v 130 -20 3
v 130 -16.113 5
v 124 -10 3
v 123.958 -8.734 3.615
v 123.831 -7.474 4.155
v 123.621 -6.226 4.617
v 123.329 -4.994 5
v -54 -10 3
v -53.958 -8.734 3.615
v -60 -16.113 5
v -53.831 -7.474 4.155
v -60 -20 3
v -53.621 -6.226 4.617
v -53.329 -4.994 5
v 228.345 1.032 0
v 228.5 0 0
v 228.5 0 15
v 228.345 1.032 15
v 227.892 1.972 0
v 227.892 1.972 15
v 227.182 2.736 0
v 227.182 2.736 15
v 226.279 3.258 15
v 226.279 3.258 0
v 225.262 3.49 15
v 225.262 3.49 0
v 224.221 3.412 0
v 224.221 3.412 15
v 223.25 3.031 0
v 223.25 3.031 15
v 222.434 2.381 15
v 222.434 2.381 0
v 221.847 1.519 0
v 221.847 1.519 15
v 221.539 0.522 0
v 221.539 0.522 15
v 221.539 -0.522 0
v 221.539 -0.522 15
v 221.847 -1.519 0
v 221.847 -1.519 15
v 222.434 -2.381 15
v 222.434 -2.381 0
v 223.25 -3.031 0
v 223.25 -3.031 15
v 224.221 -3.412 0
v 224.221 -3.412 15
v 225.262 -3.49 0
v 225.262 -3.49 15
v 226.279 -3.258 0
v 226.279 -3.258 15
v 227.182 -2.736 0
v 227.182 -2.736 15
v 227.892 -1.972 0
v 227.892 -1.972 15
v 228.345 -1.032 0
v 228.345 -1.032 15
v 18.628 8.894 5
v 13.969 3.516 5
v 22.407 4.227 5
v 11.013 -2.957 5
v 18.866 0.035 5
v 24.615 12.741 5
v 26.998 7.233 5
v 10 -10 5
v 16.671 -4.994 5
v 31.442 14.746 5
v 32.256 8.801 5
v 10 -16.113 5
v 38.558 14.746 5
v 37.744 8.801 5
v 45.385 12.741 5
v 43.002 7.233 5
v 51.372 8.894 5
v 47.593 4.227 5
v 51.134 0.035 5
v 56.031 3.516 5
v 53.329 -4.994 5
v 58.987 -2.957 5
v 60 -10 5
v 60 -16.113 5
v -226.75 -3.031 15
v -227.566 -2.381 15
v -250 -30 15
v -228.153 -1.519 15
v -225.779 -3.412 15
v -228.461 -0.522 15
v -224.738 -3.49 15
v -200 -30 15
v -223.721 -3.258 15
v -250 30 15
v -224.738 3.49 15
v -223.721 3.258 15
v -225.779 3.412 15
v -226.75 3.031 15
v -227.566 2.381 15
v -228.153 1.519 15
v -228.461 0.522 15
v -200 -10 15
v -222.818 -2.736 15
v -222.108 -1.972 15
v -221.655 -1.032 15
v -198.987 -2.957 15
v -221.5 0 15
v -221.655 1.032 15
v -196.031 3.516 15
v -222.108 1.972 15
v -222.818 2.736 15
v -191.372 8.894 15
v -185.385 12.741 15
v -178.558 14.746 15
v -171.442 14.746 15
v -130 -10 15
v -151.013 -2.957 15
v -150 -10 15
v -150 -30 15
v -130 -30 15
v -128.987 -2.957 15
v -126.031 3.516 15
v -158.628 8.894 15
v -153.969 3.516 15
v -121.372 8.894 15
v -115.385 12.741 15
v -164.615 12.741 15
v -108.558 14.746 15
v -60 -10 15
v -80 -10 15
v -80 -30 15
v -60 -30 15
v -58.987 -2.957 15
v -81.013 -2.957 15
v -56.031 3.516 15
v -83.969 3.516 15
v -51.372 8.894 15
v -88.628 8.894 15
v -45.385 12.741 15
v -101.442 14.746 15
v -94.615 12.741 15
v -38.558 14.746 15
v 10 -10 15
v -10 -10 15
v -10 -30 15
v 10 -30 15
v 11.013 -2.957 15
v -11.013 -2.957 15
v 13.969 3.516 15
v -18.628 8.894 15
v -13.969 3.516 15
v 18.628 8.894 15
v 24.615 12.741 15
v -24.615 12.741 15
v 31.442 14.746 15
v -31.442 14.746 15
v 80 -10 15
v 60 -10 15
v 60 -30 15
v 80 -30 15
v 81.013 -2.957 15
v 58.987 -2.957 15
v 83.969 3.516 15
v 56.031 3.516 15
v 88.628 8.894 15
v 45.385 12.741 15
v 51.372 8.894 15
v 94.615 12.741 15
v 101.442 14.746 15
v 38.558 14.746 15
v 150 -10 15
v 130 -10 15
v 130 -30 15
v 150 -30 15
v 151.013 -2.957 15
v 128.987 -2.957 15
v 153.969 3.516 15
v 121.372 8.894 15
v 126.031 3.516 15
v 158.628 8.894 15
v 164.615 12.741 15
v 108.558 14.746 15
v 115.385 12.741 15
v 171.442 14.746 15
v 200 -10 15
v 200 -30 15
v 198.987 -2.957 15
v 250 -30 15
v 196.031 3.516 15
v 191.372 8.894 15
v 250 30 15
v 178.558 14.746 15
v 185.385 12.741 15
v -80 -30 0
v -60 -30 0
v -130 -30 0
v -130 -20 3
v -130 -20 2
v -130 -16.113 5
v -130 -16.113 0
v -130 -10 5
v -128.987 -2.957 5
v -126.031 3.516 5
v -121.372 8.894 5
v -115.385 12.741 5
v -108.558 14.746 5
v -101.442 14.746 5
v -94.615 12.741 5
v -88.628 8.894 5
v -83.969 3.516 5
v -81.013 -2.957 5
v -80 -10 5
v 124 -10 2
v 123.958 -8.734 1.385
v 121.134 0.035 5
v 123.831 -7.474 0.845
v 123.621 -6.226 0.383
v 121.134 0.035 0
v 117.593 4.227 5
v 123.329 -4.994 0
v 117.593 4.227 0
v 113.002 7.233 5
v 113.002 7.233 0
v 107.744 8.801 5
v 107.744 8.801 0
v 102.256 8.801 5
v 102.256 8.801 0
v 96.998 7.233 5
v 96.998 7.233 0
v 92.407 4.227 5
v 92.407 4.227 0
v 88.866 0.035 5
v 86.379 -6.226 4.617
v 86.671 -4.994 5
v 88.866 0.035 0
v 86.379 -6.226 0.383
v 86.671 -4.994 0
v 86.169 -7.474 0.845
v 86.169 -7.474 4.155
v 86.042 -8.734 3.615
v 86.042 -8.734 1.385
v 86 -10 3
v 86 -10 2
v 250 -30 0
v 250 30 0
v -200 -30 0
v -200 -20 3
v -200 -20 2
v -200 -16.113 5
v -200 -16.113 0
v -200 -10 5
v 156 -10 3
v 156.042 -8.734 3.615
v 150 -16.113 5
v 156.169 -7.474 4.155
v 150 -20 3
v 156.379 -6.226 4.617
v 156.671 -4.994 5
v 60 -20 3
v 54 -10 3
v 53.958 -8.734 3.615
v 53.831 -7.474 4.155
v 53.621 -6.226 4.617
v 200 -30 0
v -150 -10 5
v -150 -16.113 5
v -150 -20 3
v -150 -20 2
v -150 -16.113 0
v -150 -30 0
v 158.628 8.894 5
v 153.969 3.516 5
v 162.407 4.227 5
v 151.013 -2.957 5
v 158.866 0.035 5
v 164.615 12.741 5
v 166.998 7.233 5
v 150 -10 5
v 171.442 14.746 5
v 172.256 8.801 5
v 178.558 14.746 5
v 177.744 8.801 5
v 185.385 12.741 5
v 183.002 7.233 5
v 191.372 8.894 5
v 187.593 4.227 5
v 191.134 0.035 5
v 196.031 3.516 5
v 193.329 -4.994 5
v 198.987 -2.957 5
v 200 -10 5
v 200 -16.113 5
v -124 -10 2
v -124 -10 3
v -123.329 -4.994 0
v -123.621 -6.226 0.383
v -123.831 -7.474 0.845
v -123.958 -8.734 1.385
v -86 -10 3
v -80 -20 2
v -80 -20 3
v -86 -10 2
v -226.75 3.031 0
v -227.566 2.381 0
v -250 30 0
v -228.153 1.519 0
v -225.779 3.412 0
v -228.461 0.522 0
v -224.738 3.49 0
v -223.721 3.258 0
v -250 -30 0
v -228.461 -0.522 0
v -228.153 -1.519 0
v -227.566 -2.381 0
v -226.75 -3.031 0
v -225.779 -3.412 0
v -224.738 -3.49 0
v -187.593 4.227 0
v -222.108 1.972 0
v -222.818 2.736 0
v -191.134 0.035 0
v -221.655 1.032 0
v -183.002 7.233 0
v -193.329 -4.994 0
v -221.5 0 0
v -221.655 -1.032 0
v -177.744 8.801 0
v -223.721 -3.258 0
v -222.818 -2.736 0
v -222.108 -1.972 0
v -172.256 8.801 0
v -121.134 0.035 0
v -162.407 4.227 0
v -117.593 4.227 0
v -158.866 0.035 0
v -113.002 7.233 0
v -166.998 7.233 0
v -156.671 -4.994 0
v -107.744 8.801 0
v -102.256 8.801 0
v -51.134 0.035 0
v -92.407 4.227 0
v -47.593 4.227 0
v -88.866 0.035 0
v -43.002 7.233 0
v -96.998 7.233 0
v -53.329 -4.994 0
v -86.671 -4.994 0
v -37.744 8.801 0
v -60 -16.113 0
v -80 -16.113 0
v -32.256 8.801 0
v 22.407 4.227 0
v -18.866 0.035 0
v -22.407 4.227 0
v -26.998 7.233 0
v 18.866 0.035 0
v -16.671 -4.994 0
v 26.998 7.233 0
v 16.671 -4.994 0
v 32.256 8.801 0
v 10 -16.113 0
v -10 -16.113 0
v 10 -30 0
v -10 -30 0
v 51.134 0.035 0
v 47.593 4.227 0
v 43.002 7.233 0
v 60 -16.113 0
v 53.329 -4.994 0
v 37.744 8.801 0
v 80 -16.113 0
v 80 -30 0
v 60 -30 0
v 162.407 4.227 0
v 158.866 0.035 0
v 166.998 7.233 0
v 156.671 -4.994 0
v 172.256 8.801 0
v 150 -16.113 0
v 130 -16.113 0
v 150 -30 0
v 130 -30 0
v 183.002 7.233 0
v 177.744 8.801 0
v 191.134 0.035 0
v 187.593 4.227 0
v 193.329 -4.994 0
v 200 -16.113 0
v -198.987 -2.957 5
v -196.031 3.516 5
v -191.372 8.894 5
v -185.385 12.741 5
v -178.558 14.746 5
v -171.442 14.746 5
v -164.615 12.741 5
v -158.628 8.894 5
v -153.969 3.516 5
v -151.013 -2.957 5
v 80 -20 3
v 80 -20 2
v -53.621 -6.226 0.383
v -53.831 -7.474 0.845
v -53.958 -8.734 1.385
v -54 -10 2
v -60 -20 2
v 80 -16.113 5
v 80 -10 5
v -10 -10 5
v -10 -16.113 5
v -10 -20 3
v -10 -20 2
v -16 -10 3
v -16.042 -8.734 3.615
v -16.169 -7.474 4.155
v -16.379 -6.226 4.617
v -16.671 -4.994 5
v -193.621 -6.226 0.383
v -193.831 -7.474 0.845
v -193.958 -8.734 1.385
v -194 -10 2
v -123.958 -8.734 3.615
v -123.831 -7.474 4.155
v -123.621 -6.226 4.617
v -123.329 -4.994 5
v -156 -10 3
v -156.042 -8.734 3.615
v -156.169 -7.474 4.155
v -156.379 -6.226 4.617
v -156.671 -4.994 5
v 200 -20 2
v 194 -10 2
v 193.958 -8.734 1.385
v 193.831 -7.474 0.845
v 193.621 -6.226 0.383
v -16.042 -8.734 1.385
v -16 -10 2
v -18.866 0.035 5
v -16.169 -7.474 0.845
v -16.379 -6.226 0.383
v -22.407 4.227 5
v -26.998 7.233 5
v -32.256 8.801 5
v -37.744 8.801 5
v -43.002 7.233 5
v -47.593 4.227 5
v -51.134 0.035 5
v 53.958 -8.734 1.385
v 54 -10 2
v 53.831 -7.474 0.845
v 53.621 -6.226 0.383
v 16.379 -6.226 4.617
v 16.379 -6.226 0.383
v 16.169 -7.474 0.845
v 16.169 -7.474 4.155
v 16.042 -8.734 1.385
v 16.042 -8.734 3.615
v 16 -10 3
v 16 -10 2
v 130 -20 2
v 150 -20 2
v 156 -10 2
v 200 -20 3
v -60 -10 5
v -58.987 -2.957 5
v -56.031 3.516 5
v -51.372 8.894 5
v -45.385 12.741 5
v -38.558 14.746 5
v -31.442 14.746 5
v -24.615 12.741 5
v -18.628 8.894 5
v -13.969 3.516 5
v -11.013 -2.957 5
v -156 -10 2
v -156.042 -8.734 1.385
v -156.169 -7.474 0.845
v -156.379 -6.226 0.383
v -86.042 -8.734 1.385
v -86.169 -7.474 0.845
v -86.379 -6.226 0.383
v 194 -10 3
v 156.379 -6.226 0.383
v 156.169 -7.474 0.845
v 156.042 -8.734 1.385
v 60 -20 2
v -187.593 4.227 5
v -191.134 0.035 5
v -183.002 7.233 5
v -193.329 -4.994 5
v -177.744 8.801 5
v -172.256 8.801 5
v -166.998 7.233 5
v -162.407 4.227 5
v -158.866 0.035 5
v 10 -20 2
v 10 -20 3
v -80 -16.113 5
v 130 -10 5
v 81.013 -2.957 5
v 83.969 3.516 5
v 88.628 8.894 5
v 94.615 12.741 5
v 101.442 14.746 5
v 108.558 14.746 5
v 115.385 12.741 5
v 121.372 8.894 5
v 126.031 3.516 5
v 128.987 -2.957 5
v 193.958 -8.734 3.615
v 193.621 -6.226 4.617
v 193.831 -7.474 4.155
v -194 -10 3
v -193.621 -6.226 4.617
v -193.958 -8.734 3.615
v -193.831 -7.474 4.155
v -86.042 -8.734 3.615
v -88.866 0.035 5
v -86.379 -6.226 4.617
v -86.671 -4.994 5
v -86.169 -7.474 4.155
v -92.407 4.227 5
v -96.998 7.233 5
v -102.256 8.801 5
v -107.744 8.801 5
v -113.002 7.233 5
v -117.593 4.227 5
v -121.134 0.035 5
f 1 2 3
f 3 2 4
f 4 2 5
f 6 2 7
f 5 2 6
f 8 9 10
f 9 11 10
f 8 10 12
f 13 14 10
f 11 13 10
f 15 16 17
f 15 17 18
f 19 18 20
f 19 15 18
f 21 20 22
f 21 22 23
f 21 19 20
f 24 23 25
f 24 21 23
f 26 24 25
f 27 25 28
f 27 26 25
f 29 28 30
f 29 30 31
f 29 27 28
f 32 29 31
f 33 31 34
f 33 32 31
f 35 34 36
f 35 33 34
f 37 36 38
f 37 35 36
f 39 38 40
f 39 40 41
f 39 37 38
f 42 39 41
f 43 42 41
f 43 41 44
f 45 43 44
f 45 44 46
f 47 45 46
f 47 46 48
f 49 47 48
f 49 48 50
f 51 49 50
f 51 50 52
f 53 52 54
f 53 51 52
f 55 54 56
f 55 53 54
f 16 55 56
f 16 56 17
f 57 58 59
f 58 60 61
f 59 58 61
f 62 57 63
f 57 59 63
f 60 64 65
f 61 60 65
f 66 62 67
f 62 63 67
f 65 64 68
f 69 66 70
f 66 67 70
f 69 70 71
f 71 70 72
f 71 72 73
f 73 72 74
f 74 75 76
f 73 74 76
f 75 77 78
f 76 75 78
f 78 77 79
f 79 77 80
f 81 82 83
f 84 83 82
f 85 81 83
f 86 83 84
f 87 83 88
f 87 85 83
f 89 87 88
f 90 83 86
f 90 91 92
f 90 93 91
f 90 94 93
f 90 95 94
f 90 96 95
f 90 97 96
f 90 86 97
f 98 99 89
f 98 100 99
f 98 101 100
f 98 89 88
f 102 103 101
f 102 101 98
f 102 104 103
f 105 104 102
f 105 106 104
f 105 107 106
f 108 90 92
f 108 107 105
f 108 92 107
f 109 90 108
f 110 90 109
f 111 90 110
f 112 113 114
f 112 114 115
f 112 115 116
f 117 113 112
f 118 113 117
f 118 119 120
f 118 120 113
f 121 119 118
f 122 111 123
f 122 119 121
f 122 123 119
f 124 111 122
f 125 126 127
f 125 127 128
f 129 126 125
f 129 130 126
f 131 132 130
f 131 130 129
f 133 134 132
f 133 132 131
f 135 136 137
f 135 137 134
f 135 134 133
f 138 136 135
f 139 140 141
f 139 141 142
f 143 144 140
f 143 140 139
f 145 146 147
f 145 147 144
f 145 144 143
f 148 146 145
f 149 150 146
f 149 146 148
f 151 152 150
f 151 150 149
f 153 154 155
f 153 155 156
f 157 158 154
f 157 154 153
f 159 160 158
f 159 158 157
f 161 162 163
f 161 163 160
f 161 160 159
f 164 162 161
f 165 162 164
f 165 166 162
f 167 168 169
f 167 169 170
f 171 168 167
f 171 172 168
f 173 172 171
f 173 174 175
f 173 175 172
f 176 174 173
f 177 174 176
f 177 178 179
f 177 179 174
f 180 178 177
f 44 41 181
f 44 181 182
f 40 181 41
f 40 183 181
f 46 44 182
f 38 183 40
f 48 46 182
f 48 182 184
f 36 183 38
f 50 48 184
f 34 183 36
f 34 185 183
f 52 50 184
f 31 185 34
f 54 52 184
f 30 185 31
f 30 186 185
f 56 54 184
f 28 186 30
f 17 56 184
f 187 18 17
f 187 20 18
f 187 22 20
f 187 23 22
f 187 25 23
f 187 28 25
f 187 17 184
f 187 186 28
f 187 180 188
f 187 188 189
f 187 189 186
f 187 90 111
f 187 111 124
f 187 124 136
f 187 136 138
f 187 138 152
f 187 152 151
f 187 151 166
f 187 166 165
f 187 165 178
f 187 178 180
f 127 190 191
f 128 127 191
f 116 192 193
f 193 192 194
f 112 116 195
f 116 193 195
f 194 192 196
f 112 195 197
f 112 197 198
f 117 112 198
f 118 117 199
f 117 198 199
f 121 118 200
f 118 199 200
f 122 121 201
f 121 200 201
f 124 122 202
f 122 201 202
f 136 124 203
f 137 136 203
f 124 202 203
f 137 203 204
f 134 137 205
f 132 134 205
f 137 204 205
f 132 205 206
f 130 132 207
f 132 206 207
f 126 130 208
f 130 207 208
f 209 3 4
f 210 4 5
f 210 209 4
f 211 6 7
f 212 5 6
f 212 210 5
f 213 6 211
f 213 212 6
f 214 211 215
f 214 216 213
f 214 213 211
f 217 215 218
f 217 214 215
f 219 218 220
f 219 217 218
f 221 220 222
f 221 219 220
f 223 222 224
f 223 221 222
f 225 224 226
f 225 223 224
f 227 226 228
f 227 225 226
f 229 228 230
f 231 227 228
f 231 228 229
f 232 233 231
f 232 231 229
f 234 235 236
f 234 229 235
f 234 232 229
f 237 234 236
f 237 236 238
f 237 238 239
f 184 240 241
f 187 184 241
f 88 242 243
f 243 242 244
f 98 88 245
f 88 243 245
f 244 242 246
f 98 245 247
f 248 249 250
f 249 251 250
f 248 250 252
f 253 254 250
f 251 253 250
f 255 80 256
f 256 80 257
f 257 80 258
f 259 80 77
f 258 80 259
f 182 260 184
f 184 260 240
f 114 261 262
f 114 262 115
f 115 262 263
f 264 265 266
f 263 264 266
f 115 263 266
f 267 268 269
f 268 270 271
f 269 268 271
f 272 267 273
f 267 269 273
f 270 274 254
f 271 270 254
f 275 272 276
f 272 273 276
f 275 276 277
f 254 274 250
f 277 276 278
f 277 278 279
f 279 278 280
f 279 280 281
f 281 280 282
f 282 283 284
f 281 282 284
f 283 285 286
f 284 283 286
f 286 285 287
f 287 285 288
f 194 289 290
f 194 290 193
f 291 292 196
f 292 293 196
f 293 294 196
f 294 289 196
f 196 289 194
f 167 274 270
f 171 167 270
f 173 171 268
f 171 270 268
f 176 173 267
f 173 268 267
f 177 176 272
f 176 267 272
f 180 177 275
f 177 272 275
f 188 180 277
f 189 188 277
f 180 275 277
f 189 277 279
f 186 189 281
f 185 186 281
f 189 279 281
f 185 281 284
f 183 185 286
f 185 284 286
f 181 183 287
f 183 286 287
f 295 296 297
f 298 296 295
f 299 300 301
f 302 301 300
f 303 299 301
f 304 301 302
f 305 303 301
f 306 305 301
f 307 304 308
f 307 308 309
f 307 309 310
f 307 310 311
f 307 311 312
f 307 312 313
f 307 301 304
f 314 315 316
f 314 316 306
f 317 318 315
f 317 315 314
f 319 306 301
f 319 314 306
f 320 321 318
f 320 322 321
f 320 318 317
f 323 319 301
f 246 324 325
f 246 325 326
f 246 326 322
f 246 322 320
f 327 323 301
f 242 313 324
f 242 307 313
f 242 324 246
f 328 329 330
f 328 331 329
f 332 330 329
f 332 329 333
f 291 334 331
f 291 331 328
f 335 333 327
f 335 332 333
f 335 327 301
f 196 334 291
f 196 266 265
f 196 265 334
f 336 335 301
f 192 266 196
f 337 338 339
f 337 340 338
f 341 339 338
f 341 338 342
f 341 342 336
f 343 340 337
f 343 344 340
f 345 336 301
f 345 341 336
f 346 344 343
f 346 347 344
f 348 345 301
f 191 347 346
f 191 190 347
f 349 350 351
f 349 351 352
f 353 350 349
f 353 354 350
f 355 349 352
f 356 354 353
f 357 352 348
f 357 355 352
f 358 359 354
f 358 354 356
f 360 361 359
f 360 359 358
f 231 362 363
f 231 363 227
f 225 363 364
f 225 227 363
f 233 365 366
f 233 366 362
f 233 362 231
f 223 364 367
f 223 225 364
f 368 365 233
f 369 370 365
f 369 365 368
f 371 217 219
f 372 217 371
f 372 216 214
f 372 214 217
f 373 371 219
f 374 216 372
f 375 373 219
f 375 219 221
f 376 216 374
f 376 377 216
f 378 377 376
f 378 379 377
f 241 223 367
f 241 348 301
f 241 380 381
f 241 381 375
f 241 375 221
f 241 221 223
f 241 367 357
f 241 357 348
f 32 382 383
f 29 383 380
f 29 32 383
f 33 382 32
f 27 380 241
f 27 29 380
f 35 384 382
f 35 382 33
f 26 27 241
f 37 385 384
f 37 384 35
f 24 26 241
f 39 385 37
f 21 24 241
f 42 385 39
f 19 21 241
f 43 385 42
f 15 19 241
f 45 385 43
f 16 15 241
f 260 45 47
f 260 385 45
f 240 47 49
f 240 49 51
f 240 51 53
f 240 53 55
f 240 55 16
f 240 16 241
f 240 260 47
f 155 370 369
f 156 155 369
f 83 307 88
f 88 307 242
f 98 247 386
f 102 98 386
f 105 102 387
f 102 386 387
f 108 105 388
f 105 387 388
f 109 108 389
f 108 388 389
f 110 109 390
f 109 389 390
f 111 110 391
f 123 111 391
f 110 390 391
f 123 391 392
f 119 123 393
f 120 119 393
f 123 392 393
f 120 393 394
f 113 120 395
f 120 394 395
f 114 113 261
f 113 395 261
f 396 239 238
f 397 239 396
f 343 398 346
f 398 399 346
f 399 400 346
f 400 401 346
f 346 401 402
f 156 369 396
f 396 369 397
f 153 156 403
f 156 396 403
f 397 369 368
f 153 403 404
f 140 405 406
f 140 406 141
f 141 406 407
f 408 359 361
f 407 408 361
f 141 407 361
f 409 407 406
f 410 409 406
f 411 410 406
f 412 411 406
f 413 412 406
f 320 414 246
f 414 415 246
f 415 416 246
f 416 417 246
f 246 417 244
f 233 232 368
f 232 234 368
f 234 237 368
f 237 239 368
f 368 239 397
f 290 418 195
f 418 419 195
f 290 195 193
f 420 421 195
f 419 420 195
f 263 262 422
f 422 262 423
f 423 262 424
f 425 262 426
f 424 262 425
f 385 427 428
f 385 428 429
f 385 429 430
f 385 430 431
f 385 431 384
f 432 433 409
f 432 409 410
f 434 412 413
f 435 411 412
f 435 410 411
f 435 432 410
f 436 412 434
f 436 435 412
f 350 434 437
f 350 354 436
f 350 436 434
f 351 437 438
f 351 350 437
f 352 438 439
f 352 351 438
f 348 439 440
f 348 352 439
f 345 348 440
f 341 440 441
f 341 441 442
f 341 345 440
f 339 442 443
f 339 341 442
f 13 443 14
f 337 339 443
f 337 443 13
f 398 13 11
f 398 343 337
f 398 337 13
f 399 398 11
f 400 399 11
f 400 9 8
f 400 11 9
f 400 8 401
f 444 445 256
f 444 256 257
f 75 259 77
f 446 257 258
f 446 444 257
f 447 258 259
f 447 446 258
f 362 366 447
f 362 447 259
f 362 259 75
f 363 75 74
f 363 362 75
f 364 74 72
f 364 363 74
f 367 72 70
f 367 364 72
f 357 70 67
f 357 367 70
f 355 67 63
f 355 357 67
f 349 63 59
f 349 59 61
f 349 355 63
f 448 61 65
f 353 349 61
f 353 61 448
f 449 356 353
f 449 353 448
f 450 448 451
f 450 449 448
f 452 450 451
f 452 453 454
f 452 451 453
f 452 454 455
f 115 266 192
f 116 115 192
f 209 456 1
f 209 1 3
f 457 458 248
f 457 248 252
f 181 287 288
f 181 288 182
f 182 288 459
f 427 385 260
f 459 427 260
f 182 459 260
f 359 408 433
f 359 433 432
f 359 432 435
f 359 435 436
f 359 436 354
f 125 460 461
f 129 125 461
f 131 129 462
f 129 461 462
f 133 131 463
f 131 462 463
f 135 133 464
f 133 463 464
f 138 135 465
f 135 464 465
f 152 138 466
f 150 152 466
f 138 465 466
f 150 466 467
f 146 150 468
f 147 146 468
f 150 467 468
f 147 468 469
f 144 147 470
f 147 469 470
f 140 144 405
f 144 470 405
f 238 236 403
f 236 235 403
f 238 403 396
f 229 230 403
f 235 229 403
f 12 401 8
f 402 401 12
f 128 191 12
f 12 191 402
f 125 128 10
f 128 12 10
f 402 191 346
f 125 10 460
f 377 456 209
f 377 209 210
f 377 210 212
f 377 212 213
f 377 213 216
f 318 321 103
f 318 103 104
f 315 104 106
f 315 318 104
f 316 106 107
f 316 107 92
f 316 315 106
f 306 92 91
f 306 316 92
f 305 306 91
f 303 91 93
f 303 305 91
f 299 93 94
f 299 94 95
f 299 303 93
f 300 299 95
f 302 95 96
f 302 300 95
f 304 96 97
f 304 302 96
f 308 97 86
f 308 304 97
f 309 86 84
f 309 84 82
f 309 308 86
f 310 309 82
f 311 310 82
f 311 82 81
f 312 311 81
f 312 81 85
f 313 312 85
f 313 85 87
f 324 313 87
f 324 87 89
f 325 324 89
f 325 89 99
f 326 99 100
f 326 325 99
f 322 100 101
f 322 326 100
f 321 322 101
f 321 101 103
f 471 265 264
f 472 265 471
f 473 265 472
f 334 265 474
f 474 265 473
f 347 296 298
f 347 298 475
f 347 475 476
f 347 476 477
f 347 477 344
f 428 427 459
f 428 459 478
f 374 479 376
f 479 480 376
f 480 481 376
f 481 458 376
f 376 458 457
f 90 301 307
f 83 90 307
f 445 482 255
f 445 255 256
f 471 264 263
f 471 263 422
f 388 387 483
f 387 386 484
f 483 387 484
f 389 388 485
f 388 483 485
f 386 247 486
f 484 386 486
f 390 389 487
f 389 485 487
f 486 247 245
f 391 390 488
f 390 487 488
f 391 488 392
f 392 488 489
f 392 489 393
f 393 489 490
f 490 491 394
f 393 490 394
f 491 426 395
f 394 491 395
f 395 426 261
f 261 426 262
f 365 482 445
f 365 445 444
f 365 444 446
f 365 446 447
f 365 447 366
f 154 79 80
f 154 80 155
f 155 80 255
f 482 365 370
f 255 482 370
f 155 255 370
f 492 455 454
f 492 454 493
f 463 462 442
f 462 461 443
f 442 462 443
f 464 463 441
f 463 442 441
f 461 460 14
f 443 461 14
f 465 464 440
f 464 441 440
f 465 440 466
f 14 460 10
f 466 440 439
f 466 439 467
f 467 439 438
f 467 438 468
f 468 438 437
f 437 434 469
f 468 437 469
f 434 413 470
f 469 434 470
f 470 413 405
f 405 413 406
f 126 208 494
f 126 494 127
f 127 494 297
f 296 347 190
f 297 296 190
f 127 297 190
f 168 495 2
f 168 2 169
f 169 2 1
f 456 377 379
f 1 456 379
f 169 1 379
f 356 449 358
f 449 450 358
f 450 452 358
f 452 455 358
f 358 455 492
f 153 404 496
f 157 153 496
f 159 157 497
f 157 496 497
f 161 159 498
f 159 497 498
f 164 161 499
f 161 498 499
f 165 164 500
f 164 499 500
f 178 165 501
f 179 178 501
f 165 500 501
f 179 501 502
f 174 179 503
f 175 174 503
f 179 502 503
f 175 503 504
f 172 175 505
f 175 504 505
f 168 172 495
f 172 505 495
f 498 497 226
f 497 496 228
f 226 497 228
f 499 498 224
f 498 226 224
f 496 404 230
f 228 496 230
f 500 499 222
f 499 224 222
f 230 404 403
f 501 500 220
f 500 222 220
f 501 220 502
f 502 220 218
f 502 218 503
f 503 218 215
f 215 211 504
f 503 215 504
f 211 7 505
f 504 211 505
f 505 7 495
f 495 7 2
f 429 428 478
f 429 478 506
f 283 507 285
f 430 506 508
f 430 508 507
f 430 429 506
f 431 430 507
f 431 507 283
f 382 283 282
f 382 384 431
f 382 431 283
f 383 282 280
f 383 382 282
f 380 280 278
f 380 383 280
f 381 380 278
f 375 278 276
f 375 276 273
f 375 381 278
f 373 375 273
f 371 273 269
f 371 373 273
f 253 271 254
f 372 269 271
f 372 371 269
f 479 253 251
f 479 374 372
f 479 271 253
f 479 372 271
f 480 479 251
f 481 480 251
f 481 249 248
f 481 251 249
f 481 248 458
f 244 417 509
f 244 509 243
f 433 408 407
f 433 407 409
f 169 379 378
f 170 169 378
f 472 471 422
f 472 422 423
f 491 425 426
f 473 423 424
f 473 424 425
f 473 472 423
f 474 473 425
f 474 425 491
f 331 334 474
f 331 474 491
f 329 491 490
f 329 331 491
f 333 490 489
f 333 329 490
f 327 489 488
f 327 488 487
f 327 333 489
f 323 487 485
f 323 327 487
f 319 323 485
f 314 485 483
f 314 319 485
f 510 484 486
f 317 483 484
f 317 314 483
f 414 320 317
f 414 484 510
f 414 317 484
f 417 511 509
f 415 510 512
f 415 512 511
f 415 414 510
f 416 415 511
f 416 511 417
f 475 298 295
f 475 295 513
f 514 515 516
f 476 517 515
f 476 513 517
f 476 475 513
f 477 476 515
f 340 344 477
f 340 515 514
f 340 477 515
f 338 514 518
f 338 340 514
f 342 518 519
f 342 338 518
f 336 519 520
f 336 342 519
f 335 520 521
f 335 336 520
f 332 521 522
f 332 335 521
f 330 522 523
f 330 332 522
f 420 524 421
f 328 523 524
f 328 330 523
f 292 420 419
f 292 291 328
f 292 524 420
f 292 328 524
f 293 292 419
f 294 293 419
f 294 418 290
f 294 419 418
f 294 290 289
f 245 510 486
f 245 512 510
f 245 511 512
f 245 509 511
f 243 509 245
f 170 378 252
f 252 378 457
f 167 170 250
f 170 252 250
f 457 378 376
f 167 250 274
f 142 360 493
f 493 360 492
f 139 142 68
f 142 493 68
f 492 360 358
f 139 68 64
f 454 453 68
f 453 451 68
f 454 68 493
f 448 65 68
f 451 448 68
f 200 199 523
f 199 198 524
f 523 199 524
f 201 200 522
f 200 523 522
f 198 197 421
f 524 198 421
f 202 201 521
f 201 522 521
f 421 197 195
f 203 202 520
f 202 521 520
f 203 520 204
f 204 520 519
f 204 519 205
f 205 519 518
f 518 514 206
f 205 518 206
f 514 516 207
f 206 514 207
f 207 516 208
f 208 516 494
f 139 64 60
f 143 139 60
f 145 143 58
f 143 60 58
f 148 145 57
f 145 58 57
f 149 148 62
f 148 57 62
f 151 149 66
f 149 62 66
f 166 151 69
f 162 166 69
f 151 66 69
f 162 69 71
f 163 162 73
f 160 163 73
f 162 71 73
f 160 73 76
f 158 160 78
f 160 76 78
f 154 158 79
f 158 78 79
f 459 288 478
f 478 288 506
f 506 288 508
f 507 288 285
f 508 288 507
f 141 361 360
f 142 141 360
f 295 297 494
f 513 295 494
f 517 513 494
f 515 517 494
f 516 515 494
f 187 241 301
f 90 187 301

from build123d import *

# Parameters (mm, degrees)
F0_R     = 3.5
F1_DEPTH = 15
F3_DEPTH = 5
F4_SIZE  = 2


with BuildPart() as f1:
    # F0 (on Top) → F1 (new body)
    with BuildSketch(Plane.XY):
        with BuildLine():
            Line((-250, 30), (-250, -30))
            Line((-250, -30), (-200, -30))
            Line((-200, -30), (-200, -10))
            ThreePointArc((-200, -10), (-175, 15), (-150, -10))
            Line((-150, -10), (-150, -30))
            Line((-150, -30), (-130, -30))
            Line((-130, -30), (-130, -10))
            ThreePointArc((-130, -10), (-105, 15), (-80, -10))
            Line((-80, -10), (-80, -30))
            Line((-80, -30), (-60, -30))
            Line((-60, -30), (-60, -10))
            ThreePointArc((-60, -10), (-35, 15), (-10, -10))
            Line((-10, -10), (-10, -30))
            Line((-10, -30), (10, -30))
            Line((10, -30), (10, -10))
            ThreePointArc((10, -10), (35, 15), (60, -10))
            Line((60, -10), (60, -30))
            Line((60, -30), (80, -30))
            Line((80, -30), (80, -10))
            ThreePointArc((80, -10), (105, 15), (130, -10))
            Line((130, -10), (130, -30))
            Line((130, -30), (150, -30))
            Line((150, -30), (150, -10))
            ThreePointArc((150, -10), (175, 15), (200, -10))
            Line((200, -10), (200, -30))
            Line((200, -30), (250, -30))
            Line((250, -30), (250, 30))
            Line((250, 30), (-250, 30))
        make_face()
        with Locations((-225, 0)):
            Circle(F0_R, mode=Mode.SUBTRACT)
        with Locations((225, 0)):
            Circle(F0_R, mode=Mode.SUBTRACT)
    extrude(amount=F1_DEPTH)

    # F2 (on face) → F3 (join)
    with BuildSketch(Plane(origin=(0, 0, 0), x_dir=(1, 0, 0), z_dir=(0, 0, -1))):
        with BuildLine():
            Line((-200, 20), (-200, 10))
            ThreePointArc((-200, 10), (-175, -15), (-150, 10))
            Line((-150, 10), (-150, 20))
            Line((-150, 20), (-156, 10))
            ThreePointArc((-156, 10), (-175, -9), (-194, 10))
            Line((-194, 10), (-200, 20))
        make_face()
        with BuildLine():
            ThreePointArc((-86, 10), (-105, -9), (-124, 10))
            Line((-124, 10), (-130, 20))
            Line((-130, 20), (-130, 10))
            ThreePointArc((-130, 10), (-105, -15), (-80, 10))
            Line((-80, 10), (-80, 20))
            Line((-80, 20), (-86, 10))
        make_face()
        with BuildLine():
            ThreePointArc((-16, 10), (-35, -9), (-54, 10))
            Line((-54, 10), (-60, 20))
            Line((-60, 20), (-60, 10))
            ThreePointArc((-60, 10), (-35, -15), (-10, 10))
            Line((-10, 10), (-10, 20))
            Line((-10, 20), (-16, 10))
        make_face()
        with BuildLine():
            ThreePointArc((54, 10), (35, -9), (16, 10))
            Line((16, 10), (10, 20))
            Line((10, 20), (10, 10))
            ThreePointArc((10, 10), (35, -15), (60, 10))
            Line((60, 10), (60, 20))
            Line((60, 20), (54, 10))
        make_face()
        with BuildLine():
            ThreePointArc((124, 10), (105, -9), (86, 10))
            Line((86, 10), (80, 20))
            Line((80, 20), (80, 10))
            ThreePointArc((80, 10), (105, -15), (130, 10))
            Line((130, 10), (130, 20))
            Line((130, 20), (124, 10))
        make_face()
        with BuildLine():
            ThreePointArc((194, 10), (175, -9), (156, 10))
            Line((156, 10), (150, 20))
            Line((150, 20), (150, 10))
            ThreePointArc((150, 10), (175, -15), (200, 10))
            Line((200, 10), (200, 20))
            Line((200, 20), (194, 10))
        make_face()
    extrude(amount=-F3_DEPTH)

    # F4
    f4_edges = [f1.edges().sort_by_distance(p)[0] for p in [
        (-197, -15, 5),
        (-197, -15, 0),
        (-57, -15, 0),
        (-57, -15, 5),
        (-127, -15, 5),
        (-127, -15, 0),
        (-153, -15, 5),
        (-153, -15, 0),
        (-83, -15, 5),
        (-83, -15, 0),
        (-13, -15, 0),
        (-13, -15, 5),
        (57, -15, 5),
        (57, -15, 0),
        (127, -15, 5),
        (127, -15, 0),
        (197, -15, 5),
        (197, -15, 0),
        (13, -15, 5),
        (13, -15, 0),
        (83, -15, 5),
        (83, -15, 0),
        (153, -15, 5),
        (153, -15, 0),
    ]]
    chamfer(f4_edges, length=F4_SIZE)


solid = f1.part
